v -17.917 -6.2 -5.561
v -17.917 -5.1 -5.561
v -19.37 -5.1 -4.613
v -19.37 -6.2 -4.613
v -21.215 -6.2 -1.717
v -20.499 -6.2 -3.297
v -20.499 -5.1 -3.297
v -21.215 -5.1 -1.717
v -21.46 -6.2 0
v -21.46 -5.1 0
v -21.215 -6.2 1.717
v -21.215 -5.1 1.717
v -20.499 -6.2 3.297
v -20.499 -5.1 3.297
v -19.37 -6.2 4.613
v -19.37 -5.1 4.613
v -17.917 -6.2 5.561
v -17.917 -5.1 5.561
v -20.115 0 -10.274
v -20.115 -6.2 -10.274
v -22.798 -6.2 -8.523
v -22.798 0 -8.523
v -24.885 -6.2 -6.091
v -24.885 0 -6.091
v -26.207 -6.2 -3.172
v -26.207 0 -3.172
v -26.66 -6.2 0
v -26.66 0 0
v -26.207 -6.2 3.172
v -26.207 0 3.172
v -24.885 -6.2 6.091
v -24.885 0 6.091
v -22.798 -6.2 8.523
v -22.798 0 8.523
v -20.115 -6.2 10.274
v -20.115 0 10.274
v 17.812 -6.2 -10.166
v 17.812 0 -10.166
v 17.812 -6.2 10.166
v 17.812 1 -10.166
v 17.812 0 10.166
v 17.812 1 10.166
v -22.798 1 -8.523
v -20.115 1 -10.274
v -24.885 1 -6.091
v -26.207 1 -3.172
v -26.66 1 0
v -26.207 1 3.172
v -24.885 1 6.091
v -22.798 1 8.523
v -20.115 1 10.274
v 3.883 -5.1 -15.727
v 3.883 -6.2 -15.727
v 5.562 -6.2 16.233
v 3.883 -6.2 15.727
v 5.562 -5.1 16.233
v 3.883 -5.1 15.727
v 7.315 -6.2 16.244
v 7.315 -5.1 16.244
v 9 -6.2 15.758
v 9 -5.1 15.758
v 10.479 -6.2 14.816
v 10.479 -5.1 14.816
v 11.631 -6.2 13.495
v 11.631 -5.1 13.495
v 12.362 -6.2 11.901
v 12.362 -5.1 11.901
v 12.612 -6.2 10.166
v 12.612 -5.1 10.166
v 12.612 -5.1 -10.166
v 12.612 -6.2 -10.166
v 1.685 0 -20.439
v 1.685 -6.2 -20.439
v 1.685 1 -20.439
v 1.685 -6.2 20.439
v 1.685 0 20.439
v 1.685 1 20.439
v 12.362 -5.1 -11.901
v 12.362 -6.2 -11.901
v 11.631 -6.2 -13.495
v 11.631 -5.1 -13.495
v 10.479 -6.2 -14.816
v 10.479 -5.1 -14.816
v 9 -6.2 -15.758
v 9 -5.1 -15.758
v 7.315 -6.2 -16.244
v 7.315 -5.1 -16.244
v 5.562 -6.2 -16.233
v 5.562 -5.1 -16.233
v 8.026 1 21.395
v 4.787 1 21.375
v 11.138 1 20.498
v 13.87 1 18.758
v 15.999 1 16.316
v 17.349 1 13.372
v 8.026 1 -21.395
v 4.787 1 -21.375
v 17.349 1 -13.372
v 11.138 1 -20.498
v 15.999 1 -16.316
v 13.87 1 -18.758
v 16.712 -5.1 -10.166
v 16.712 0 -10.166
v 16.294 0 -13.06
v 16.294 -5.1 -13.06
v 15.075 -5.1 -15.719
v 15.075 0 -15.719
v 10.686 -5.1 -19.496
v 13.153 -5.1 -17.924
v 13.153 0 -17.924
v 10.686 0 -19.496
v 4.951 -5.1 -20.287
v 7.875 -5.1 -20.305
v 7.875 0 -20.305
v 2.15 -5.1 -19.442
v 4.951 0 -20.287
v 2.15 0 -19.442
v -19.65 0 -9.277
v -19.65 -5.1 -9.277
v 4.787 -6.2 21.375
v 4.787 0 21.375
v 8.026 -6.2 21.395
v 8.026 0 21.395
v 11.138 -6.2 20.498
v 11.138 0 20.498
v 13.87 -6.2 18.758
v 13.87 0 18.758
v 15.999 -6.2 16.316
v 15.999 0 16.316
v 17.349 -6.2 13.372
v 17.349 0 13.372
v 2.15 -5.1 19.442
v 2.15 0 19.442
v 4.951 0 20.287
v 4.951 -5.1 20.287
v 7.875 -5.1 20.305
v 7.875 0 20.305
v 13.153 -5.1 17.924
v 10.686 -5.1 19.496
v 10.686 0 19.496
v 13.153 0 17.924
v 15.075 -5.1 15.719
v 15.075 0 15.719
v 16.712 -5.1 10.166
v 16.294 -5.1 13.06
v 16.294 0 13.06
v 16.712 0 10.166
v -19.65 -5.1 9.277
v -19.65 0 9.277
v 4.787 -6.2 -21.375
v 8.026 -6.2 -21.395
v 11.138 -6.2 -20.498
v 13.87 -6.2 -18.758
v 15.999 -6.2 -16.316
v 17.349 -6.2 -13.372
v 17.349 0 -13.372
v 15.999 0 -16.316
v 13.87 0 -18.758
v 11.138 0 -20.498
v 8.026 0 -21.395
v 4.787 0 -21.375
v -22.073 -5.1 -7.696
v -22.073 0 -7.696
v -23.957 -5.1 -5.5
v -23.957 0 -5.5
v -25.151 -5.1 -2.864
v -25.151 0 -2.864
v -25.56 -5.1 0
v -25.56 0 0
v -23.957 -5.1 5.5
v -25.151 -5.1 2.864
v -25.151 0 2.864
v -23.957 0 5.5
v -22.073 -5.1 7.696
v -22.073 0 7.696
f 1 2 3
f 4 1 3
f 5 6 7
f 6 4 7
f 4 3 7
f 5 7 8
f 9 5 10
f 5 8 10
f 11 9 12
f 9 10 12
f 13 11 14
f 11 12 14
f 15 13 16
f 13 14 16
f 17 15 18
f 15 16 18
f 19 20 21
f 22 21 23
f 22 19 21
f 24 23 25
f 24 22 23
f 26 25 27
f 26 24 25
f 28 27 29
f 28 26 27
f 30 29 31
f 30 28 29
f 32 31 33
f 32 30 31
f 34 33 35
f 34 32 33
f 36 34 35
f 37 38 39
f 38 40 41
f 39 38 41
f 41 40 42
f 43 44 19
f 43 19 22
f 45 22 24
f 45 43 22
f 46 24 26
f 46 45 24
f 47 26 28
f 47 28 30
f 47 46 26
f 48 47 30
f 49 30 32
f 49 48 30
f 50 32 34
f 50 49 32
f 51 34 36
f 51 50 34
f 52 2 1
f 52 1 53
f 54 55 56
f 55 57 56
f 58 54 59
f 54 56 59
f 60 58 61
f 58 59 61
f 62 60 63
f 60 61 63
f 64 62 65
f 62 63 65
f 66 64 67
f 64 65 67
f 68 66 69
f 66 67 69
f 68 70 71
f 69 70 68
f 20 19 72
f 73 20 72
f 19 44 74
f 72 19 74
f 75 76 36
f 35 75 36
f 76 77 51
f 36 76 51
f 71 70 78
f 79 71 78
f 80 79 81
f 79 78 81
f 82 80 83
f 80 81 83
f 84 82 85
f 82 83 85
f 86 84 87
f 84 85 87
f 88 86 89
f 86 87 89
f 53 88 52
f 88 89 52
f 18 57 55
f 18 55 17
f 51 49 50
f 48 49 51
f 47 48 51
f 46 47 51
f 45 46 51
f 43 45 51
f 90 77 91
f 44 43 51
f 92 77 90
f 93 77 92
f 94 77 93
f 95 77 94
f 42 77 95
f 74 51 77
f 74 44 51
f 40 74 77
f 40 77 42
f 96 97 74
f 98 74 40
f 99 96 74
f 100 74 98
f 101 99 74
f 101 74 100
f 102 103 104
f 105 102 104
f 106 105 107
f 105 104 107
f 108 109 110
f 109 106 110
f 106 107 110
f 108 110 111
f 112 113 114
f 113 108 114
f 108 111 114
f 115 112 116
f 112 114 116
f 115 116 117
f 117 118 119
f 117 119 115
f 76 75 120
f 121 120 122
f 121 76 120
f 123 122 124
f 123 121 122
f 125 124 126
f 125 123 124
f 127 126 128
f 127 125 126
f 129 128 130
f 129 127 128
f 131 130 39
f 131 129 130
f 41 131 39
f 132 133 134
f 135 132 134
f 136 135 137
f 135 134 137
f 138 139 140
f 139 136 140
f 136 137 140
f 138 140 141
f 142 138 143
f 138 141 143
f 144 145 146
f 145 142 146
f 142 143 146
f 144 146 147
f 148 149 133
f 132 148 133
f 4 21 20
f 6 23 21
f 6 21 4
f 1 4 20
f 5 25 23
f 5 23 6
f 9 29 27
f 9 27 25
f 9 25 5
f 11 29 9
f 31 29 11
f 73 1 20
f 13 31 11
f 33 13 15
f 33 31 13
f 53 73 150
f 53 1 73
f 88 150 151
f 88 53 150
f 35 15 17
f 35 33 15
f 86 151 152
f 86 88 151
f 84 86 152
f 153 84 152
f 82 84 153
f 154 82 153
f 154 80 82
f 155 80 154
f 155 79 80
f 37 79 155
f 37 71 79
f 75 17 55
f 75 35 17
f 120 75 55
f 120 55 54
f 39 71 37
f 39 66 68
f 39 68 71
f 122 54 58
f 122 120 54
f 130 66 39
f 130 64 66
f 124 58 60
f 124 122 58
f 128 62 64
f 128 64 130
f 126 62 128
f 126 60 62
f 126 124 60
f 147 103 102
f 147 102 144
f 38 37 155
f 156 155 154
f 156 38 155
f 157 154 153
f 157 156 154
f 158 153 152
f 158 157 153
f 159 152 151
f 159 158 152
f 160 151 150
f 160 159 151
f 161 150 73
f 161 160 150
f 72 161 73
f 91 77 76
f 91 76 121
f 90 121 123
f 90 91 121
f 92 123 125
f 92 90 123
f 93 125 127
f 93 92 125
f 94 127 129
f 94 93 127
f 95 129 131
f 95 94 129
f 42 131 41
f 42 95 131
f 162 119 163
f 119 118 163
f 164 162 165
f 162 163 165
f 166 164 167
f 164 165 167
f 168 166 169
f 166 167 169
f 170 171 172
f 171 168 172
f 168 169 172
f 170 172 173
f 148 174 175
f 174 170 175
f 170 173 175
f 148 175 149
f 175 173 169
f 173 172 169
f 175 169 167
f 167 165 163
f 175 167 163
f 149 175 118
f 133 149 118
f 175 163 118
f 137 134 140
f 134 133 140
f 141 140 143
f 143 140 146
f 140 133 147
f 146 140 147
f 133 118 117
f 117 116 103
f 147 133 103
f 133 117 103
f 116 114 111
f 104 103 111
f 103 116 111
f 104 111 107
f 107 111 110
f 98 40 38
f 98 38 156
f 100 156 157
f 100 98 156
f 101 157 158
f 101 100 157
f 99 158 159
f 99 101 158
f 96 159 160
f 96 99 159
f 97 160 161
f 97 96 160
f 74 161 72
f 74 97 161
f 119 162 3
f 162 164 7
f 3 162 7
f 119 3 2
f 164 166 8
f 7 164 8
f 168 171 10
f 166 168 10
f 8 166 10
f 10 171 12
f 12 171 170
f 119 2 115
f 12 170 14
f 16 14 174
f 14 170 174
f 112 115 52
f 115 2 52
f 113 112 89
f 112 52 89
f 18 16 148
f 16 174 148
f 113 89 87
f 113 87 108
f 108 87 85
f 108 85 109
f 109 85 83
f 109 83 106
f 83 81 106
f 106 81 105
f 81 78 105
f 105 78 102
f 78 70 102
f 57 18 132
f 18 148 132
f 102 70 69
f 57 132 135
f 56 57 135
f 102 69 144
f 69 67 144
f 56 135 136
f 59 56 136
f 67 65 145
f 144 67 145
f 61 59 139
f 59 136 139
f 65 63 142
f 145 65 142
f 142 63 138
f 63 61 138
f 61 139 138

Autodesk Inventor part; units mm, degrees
ref_plane "YZ Plane" through (0, 0, 0) normal (1, 0, 0) x (0, 1, 0)
ref_plane "XZ Plane" through (0, 0, 0) normal (0, 1, 0) x (-1, 0, 0)
ref_plane "XY Plane" through (0, 0, 0) normal (0, 0, 1) x (1, 0, 0)
sketch "Sketch1" plane through (0, 0, 0) normal (0, 1, 0) x (-1, 0, 0)
  line L0 (41.1155, 0) -> (-17.3761, 27.2751)
  line L1 (-17.3761, 27.2751) -> (-17.3761, -27.2751)
  line L2 (-17.3761, -27.2751) -> (41.1155, 0)
  circle A0 centre (-6.4761, -10.1655) radius 10.9
  circle A1 centre (-6.4761, 10.1655) radius 10.9
  circle A2 centre (15.3239, 0) radius 10.9
  circle A3 centre (0, 0) radius 17.3761
  line L3 (52.8138, 0) -> (-29.0745, 0) projected
  point P0 (-1.8696, 20.0443)
  point P1 (-17.3761, 10.1655)
  point P2 (-17.3761, -10.1655)
  point P3 (-1.8696, -20.0443)
  point P4 (19.9304, -9.8788)
  point P5 (19.9304, 9.8788)
  dimension "d0" = 50
  dimension "d1" = 21.8
  dimension "d2" = 32.7
  dimension "d3" = 21.8
  dimension "d4" = 21.8
extrude "Extrusion1" add sketch "Sketch1" along normal blind 1 contours A2 A3 L0 | A2 L3 A3 | L2 A3 A2 | A2 A3 L3 | A3 A1 L0 | A3 A2 L3 A1 | A3 L3 A2 | L2 A0 A3 | A3 A0 L3 A2 | A2 L3 A3 | A1 A3 | A1 A0 A3 | A0 A3 | A3 A0 A1 | A1 A3 L1 | A1 L3 A3 | L3 A0 | A1 L3 | L1 A3 A0 | A3 L3 A0
sketch "Sketch2" plane through (0, 1, 0) normal (0, 1, 0) x (1, 0, 0)
  line L0 (17.3761, -10.1655) -> (17.3761, 10.1655) projected
  arc A0 (17.3761, 10.1655) -> (1.8696, 20.0443) centre (6.4761, 10.1655) ccw projected
  line L1 (1.8696, 20.0443) -> (-19.9304, 9.8788) projected
  arc A1 (-19.9304, 9.8788) -> (-19.9304, -9.8788) centre (-15.3239, 0) ccw projected
  line L2 (-19.9304, -9.8788) -> (1.8696, -20.0443) projected
  arc A2 (1.8696, -20.0443) -> (17.3761, -10.1655) centre (6.4761, -10.1655) ccw projected
  circle A3 centre (-15.3239, 0) radius 11.336
  circle A4 centre (6.4761, -10.1655) radius 11.336
  circle A5 centre (6.4761, 10.1655) radius 11.336
  line L3 (-20.1147, -10.2739) -> (1.6853, -20.4394)
  line L4 (-20.1147, 10.2739) -> (1.6853, 20.4394)
  line L5 (17.8121, -26) -> (17.8121, 10.1655)
  point P0 (0, 0)
  point P1 (17.8121, -10.1655)
  dimension "d9" = 22.672
  dimension "d7" = 22.672
  dimension "d8" = 22.672
extrude "Extrusion2" add sketch "Sketch2" against normal blind 1
sketch "Sketch3" plane through (0, 0, 0) normal (0, -1, 0) x (1, 0, 0)
  arc A0 (1.6853, -20.4394) -> (17.8121, -10.1655) centre (6.4761, -10.1655) ccw projected
  line L0 (17.8121, -10.1655) -> (17.8121, 10.1655) projected
  arc A1 (17.8121, 10.1655) -> (1.6853, 20.4394) centre (6.4761, 10.1655) ccw projected
  line L1 (1.6853, 20.4394) -> (-20.1147, 10.2739) projected
  arc A2 (-20.1147, 10.2739) -> (-20.1147, -10.2739) centre (-15.3239, 0) ccw projected
  line L2 (-20.1147, -10.2739) -> (1.6853, -20.4394) projected
  circle A3 centre (-15.3239, 0) radius 10.236
  circle A4 centre (6.4761, 10.1655) radius 10.236
  circle A5 centre (6.4761, -10.1655) radius 10.236
  line L3 (-19.6498, -9.277) -> (2.1502, -19.4425)
  line L4 (16.7121, -10.1655) -> (16.7121, 10.1655)
  line L5 (-19.6498, 9.277) -> (2.1502, 19.4425)
  point P0 (0, 0)
  point P1 (-8.7498, -14.3597)
  dimension "d17" = 1.1
extrude "Extrusion3" add sketch "Sketch3" along normal blind 5.1
sketch "Sketch4" plane through (0, -5.1, 0) normal (0, -1, 0) x (1, 0, 0)
  line L0 (1.6853, 20.4394) -> (-20.1147, 10.2739) projected
  arc A0 (17.8121, 10.1655) -> (1.6853, 20.4394) centre (6.4761, 10.1655) ccw projected
  line L1 (17.8121, -10.1655) -> (17.8121, 10.1655) projected
  arc A1 (1.6853, -20.4394) -> (17.8121, -10.1655) centre (6.4761, -10.1655) ccw projected
  line L2 (-20.1147, -10.2739) -> (1.6853, -20.4394) projected
  arc A2 (-20.1147, 10.2739) -> (-20.1147, -10.2739) centre (-15.3239, 0) ccw projected
  circle A3 centre (6.4761, -10.1655) radius 6.136
  circle A4 centre (6.4761, 10.1655) radius 6.136
  circle A5 centre (-15.3239, 0) radius 6.136
  line L3 (-17.917, -5.5611) -> (3.883, -15.7266)
  line L4 (12.6121, -10.1655) -> (12.6121, 10.1655)
  line L5 (3.883, 15.7266) -> (-17.917, 5.5611)
  point P0 (0, 0)
  dimension "d18" = 5.2
extrude "Extrusion4" add sketch "Sketch4" along normal blind 1.1
properties part number "Magne_Cover"
